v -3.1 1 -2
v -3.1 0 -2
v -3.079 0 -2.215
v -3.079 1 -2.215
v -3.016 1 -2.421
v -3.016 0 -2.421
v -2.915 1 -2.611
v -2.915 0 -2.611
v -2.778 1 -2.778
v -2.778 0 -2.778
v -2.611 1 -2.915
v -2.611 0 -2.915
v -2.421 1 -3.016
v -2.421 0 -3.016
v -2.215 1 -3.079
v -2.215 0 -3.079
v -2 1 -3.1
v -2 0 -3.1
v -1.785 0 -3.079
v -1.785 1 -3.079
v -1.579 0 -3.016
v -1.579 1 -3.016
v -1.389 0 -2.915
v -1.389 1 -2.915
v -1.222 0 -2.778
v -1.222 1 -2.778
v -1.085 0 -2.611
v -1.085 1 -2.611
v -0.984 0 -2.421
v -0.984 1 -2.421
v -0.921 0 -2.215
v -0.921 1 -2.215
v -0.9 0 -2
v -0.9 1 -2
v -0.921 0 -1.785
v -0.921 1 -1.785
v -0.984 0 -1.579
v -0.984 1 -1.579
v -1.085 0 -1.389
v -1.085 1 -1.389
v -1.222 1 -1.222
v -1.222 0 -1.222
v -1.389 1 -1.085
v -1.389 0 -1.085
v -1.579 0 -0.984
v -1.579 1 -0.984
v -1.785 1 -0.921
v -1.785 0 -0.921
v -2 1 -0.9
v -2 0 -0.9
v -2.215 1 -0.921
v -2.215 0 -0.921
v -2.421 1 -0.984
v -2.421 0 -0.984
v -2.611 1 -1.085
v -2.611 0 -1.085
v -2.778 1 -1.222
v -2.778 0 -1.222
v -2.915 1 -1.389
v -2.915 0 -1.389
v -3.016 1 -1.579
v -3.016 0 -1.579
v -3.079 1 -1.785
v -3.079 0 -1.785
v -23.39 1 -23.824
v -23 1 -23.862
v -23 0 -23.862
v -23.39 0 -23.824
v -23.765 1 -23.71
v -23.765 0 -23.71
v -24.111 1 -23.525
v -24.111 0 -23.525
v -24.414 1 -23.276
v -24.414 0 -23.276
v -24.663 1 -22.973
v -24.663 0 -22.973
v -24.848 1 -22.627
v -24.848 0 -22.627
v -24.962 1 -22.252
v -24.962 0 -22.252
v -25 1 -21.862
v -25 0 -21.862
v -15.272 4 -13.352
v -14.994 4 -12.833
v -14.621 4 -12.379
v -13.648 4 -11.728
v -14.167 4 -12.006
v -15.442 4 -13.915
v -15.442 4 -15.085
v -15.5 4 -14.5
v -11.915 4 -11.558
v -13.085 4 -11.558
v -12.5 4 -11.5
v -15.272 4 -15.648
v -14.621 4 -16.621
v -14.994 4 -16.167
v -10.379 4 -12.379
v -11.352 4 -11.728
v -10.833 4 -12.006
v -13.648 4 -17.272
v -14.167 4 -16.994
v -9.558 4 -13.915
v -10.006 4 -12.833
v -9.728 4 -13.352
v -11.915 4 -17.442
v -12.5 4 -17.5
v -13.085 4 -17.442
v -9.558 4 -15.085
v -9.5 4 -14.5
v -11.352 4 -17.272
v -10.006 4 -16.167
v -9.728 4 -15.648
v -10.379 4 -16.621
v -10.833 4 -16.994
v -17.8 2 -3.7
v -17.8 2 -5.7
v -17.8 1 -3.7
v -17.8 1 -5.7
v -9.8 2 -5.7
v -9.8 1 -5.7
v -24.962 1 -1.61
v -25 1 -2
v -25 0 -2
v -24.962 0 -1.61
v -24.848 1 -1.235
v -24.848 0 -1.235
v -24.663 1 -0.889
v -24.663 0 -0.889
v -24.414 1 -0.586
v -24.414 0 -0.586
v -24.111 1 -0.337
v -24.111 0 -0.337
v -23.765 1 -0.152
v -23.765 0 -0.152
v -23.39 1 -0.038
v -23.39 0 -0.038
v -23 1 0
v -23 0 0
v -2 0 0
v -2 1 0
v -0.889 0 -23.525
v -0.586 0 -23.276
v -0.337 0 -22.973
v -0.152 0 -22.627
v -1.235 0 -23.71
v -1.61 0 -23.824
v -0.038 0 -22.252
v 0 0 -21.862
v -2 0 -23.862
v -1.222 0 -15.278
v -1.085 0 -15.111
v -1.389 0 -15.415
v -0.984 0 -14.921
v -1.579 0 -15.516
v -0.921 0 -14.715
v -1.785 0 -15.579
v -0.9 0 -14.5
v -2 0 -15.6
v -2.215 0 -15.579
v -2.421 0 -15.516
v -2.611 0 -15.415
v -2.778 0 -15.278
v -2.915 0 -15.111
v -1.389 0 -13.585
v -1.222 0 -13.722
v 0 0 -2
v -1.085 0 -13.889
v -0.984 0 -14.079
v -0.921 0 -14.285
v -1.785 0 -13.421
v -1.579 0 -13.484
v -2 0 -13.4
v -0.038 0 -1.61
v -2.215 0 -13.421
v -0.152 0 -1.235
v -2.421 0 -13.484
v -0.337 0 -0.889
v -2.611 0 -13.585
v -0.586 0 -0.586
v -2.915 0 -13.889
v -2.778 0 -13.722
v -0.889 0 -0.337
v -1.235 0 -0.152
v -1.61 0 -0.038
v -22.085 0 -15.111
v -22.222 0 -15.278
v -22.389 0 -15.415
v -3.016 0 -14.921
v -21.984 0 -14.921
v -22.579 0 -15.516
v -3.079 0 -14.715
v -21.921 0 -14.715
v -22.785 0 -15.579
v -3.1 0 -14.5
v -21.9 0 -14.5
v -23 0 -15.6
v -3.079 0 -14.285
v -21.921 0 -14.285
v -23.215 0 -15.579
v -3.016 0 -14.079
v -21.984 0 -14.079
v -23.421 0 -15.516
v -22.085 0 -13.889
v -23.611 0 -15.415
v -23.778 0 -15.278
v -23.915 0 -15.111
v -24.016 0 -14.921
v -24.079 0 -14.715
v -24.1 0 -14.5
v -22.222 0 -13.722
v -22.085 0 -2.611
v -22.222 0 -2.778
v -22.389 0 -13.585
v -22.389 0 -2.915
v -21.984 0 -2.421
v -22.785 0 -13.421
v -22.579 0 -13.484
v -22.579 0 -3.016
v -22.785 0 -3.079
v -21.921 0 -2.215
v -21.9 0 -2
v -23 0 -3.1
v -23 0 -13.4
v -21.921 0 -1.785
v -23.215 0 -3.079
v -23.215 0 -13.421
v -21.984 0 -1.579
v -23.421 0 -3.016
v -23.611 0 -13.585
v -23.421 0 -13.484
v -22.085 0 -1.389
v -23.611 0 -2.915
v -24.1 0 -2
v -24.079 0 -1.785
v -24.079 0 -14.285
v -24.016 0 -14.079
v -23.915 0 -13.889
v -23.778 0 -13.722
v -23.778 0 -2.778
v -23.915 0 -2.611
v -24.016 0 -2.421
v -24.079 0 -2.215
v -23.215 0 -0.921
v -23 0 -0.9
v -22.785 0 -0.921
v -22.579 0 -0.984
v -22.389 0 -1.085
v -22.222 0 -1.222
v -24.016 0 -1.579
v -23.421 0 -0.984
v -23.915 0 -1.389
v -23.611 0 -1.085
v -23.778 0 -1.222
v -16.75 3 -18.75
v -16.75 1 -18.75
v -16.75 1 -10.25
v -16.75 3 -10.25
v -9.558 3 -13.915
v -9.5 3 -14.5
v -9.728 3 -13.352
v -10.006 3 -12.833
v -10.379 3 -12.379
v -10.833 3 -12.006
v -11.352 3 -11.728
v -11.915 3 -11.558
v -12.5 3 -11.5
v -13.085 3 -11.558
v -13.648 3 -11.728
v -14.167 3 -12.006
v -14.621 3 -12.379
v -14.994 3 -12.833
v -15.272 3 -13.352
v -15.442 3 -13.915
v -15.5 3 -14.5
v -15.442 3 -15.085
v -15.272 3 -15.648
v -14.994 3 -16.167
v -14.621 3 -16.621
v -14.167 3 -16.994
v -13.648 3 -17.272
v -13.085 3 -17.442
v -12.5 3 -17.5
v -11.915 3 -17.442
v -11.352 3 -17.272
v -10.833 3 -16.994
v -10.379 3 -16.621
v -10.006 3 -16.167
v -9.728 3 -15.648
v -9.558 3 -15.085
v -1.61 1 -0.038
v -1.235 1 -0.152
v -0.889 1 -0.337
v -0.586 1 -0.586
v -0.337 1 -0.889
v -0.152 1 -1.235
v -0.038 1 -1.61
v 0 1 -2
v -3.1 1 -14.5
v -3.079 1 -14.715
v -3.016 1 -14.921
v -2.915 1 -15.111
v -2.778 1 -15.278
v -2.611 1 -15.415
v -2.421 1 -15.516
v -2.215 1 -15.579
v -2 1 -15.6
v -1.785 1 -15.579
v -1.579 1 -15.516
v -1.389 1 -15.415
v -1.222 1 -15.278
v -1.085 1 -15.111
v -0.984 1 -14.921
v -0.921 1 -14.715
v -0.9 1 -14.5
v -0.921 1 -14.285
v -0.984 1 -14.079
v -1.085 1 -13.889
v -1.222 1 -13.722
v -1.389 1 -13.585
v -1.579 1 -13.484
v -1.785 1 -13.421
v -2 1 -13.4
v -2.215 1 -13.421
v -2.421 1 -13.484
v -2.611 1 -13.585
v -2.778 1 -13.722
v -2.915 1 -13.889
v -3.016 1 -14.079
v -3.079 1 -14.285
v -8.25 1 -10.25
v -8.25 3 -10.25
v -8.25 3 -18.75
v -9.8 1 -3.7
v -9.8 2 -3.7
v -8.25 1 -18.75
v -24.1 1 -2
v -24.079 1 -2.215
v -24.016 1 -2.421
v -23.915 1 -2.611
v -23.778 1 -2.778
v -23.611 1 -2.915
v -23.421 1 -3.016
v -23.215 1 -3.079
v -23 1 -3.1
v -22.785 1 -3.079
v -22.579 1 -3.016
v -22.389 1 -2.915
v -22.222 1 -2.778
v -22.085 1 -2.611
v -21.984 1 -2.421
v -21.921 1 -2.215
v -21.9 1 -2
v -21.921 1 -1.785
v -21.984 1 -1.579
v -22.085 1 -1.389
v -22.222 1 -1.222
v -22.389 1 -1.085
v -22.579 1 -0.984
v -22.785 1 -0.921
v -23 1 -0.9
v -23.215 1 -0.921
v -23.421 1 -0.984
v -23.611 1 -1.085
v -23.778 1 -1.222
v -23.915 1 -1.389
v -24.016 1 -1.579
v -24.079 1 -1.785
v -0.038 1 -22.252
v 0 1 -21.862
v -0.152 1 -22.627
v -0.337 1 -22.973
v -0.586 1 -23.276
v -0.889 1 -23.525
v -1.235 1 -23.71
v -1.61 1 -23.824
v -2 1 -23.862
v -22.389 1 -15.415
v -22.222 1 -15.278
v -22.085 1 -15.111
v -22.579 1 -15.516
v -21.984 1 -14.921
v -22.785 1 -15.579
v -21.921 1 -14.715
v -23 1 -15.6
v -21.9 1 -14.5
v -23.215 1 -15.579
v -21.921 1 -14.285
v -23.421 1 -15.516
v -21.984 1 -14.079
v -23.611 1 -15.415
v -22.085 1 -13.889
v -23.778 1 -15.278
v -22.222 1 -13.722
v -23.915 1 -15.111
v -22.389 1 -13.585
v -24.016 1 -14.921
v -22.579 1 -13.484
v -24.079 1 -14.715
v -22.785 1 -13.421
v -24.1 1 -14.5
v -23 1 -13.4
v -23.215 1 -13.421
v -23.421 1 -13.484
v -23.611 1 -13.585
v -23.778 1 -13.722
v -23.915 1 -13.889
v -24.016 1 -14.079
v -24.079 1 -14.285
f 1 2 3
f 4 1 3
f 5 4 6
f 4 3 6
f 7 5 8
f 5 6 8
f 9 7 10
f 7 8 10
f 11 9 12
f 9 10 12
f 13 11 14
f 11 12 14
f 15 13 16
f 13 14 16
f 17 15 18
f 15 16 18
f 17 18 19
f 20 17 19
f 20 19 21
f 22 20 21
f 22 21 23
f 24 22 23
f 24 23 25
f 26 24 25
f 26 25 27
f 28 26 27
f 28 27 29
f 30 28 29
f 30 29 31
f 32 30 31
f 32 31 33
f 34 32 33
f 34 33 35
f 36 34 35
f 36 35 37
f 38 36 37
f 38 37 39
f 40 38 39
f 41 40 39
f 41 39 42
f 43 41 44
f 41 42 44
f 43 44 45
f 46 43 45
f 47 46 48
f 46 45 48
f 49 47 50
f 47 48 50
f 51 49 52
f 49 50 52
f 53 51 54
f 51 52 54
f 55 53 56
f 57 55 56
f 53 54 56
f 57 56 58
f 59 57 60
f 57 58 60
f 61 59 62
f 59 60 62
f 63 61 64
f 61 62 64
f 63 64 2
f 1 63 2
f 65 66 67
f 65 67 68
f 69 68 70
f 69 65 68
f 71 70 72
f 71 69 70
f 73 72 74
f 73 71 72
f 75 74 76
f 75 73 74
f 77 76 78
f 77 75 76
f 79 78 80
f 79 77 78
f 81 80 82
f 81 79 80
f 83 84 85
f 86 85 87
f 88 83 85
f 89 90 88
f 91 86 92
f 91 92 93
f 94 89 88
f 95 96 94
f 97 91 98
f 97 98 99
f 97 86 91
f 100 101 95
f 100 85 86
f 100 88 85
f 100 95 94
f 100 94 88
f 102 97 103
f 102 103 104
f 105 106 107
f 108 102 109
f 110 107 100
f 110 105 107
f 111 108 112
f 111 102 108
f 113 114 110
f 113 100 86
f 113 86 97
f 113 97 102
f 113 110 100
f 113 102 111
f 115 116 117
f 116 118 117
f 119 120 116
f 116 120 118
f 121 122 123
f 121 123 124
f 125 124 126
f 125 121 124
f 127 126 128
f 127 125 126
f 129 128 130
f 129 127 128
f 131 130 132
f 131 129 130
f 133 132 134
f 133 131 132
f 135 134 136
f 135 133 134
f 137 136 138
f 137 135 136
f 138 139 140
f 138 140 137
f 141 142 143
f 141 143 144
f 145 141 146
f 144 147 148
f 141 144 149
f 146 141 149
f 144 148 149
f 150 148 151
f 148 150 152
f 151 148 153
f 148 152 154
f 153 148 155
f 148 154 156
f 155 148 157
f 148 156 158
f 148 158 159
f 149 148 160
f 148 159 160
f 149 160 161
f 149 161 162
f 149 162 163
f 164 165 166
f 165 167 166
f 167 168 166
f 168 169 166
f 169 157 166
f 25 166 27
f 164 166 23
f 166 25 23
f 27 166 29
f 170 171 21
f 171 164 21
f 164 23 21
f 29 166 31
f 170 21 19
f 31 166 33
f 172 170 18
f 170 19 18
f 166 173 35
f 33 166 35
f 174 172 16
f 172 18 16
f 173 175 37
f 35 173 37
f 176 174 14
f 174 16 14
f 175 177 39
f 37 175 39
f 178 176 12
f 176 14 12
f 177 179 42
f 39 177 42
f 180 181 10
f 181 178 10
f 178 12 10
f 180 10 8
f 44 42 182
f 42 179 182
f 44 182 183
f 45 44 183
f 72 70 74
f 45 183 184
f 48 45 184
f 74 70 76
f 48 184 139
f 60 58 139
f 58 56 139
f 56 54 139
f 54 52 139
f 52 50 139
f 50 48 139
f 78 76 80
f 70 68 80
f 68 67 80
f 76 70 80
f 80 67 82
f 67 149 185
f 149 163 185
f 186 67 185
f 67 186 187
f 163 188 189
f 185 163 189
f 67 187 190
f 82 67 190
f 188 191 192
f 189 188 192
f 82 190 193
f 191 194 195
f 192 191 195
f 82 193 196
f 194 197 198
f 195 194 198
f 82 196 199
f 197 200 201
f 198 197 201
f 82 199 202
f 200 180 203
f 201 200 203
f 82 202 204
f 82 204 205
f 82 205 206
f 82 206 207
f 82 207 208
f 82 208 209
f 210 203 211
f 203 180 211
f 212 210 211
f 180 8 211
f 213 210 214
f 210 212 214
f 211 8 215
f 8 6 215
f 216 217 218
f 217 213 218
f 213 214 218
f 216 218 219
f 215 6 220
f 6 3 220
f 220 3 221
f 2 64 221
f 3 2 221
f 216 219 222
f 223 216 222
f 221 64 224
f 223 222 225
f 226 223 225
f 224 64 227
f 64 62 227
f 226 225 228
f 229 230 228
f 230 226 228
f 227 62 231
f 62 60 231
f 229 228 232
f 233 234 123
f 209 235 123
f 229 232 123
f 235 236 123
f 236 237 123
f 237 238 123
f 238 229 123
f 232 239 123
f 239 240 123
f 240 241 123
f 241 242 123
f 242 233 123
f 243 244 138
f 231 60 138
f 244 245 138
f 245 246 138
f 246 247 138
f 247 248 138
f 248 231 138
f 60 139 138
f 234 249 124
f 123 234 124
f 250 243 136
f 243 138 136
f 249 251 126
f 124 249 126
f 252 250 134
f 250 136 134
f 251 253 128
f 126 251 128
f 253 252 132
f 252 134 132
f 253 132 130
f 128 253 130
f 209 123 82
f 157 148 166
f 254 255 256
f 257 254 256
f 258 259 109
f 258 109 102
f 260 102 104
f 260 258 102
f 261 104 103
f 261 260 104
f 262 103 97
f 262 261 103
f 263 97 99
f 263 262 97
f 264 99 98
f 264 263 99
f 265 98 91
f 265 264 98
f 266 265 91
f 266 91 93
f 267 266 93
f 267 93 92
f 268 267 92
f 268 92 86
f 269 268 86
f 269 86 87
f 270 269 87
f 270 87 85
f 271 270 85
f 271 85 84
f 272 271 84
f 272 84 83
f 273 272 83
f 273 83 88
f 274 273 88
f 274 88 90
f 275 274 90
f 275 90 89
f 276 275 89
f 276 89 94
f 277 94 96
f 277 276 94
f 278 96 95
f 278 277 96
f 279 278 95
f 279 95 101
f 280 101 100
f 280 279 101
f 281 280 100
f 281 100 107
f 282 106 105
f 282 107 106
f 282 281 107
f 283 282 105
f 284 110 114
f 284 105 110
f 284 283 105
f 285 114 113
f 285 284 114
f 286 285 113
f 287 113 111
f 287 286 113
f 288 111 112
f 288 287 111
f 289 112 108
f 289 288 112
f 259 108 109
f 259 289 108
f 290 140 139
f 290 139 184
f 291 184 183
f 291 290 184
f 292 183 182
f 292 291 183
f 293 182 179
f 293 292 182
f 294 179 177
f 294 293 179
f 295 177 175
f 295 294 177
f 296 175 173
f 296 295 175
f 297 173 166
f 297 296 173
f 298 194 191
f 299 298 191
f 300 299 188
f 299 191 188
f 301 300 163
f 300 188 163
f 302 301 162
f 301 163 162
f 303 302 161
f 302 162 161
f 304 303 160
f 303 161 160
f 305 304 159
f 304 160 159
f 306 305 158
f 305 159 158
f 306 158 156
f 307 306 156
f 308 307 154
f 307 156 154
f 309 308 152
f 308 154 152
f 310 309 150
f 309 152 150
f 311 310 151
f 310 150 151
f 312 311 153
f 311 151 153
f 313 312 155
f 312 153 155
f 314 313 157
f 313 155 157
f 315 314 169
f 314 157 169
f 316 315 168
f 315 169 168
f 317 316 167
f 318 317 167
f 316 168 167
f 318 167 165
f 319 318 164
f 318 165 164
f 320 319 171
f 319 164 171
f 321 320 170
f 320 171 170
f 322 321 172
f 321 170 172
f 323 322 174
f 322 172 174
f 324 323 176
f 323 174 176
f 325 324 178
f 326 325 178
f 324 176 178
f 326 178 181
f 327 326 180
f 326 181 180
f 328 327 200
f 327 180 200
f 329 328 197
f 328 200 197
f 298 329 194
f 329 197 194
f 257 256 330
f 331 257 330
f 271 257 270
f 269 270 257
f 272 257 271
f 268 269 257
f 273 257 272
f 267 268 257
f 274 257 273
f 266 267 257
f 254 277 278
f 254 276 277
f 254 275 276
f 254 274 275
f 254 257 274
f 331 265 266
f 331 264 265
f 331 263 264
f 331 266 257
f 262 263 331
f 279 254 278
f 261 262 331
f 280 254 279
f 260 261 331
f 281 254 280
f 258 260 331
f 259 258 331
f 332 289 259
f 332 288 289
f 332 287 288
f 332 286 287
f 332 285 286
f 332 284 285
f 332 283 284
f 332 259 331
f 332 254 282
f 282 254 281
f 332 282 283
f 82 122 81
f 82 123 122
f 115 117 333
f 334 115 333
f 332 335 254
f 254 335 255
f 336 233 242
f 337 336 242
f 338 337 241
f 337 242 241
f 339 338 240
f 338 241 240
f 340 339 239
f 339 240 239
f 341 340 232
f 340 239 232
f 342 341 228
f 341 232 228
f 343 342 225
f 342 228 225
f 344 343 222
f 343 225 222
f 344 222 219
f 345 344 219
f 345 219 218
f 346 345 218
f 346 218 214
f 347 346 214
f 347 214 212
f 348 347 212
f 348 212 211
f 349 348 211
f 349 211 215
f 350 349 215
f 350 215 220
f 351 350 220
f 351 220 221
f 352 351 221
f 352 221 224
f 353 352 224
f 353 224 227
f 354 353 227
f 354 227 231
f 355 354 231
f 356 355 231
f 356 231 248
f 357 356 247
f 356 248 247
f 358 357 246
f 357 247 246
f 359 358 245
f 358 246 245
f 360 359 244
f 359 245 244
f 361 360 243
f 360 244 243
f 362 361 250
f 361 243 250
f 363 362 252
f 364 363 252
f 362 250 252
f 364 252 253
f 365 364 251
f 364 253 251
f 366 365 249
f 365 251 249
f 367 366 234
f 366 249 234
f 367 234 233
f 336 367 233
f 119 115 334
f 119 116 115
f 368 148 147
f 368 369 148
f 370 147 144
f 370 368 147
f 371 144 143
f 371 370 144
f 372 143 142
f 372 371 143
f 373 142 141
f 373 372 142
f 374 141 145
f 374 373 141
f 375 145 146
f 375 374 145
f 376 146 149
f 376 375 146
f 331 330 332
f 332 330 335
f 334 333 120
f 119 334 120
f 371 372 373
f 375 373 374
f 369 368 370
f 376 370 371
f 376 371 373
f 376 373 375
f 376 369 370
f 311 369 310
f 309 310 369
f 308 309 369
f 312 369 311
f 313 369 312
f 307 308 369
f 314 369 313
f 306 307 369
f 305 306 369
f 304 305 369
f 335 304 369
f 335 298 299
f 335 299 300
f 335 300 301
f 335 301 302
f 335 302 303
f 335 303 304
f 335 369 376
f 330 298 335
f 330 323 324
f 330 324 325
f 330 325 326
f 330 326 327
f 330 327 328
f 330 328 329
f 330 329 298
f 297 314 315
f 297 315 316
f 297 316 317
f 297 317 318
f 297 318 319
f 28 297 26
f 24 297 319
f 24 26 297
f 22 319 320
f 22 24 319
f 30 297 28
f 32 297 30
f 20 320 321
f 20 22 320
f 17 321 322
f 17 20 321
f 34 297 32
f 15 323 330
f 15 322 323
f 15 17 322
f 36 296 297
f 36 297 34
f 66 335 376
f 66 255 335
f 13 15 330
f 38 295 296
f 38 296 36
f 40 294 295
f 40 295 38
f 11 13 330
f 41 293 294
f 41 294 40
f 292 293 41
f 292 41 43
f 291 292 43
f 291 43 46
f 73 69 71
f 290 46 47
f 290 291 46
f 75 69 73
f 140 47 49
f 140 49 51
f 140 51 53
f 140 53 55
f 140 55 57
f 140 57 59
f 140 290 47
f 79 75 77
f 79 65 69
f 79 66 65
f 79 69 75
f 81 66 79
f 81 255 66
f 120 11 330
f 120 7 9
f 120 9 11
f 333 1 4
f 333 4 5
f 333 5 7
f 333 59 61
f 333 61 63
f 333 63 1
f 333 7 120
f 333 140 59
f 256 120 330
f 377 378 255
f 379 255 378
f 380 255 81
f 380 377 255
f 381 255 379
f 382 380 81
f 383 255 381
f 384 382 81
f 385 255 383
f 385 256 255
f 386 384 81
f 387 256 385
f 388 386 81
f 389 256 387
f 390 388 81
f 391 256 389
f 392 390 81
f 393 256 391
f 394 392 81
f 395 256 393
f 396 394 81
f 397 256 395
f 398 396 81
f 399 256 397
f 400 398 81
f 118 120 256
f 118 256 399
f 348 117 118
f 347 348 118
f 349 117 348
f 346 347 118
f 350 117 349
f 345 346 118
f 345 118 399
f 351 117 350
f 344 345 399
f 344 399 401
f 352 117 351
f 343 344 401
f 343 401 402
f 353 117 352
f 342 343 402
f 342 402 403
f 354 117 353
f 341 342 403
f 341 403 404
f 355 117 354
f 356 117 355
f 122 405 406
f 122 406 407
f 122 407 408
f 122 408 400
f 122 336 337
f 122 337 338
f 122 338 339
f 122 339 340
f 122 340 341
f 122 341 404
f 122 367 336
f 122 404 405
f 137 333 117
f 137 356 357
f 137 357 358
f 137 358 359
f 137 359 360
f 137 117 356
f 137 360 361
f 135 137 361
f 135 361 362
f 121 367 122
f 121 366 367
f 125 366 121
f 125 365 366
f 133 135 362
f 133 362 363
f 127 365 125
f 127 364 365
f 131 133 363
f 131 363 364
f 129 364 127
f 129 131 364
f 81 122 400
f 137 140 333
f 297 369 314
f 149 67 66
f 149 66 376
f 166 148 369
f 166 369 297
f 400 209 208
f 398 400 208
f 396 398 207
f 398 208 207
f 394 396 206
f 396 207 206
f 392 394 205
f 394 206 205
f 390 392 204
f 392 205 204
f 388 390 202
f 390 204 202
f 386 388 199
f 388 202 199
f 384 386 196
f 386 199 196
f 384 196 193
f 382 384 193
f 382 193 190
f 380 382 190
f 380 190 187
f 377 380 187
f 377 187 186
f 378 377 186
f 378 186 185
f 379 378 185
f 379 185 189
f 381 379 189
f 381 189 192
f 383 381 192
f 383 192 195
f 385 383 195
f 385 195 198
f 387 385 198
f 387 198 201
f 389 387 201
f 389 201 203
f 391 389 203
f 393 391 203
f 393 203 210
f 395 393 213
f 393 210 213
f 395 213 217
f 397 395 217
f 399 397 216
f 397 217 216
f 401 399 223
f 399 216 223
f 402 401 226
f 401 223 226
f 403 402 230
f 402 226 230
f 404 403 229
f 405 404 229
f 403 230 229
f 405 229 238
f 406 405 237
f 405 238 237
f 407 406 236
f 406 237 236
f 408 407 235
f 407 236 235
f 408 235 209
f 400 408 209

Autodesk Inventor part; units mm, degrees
ref_plane "YZ Plane" through (0, 0, 0) normal (1, 0, 0) x (0, 1, 0)
ref_plane "XZ Plane" through (0, 0, 0) normal (0, 1, 0) x (-1, 0, 0)
ref_plane "XY Plane" through (0, 0, 0) normal (0, 0, 1) x (1, 0, 0)
sketch "Sketch1" plane through (0, 0, 0) normal (0, 1, 0) x (-1, 0, 0)
  line L0 (0, 0) -> (25, 0)
  line L1 (25, 0) -> (25, -23.862)
  line L2 (25, -23.862) -> (0, -23.862)
  line L3 (0, -23.862) -> (0, 0)
  line L4 (0, 0) -> (0, -2)
  line L5 (0, -2) -> (2, -2)
  line L6 (25, 0) -> (25, -2)
  line L7 (25, -2) -> (23, -2)
  circle A0 centre (2, -2) radius 1.1
  circle A1 centre (23, -2) radius 1.1
  line L8 (0, -2) -> (0, -14.5)
  line L9 (0, -14.5) -> (2, -14.5)
  line L10 (23, -2) -> (23, -14.5)
  circle A2 centre (23, -14.5) radius 1.1
  circle A3 centre (2, -14.5) radius 1.1
  dimension "d0" = 25
  dimension "d1" = 23.862
  dimension "d2" = 2
  dimension "d3" = 2
  dimension "d4" = 2
  dimension "d5" = 2
  dimension "d6" = 2.2
  dimension "d7" = 2.2
  dimension "d8" = 12.5
  dimension "d9" = 2
  dimension "d10" = 12.5
  dimension "d11" = 2.2
  dimension "d12" = 2.2
extrude "Extrusion1" add sketch "Sketch1" along normal blind 1
fillet "Fillet1" radius 2 4 edges at (0, 0.5, 0) (0, 0.5, -23.862) (-25, 0.5, -23.862) (-25, 0.5, 0)
sketch "Sketch2" plane through (0, 1, 0) normal (0, 1, 0) x (1, 0, 0)
  arc A0 (-25, 2) -> (-23, 0) centre (-23, 2) ccw projected
  line L0 (-23, 0) -> (-2, 0) projected
  arc A1 (-2, 0) -> (0, 2) centre (-2, 2) ccw projected
  line L1 (0, 2) -> (0, 21.862) projected
  arc A2 (0, 21.862) -> (-2, 23.862) centre (-2, 21.862) ccw projected
  line L2 (-2, 23.862) -> (-23, 23.862) projected
  arc A3 (-23, 23.862) -> (-25, 21.862) centre (-23, 21.862) ccw projected
  line L3 (-25, 21.862) -> (-25, 2) projected
  circle A4 centre (-23, 14.5) radius 1.1 projected
  circle A5 centre (-23, 2) radius 1.1 projected
  circle A6 centre (-2, 14.5) radius 1.1 projected
  circle A7 centre (-2, 2) radius 1.1 projected
  circle A8 centre (-23, 14.5) radius 1.1 projected
  circle A9 centre (-2, 14.5) radius 1.1 projected
  line L4 (-23, 14.5) -> (-2, 14.5)
  line L5 (-12.5, 14.5) -> (-16.75, 14.5)
  line L6 (-16.75, 14.5) -> (-16.75, 10.25)
  line L7 (-16.75, 10.25) -> (-8.25, 10.25)
  line L8 (-8.25, 10.25) -> (-8.25, 18.75)
  line L9 (-8.25, 18.75) -> (-16.75, 18.75)
  line L10 (-16.75, 18.75) -> (-16.75, 10.25)
  point P0 (0, 0)
  dimension "d16" = 4.25
  dimension "d17" = 4.25
  dimension "d18" = 8.5
  dimension "d19" = 8.5
extrude "Extrusion2" add sketch "Sketch2" along normal blind 2 contours L10 L9 L8 L4 | L4 L8 L7 L6
sketch "Sketch3" plane through (0, 3, 0) normal (0, 1, 0) x (1, 0, 0)
  line L0 (-16.75, 18.75) -> (-16.75, 10.25) projected
  line L1 (-16.75, 10.25) -> (-8.25, 10.25) projected
  line L2 (-8.25, 10.25) -> (-8.25, 18.75) projected
  line L3 (-8.25, 18.75) -> (-16.75, 18.75) projected
  circle A0 centre (-12.5, 14.5) radius 3
  point P0 (0, 0)
  dimension "d22" = 6
extrude "Extrusion3" add sketch "Sketch3" along normal blind 1 contours A0
sketch "Sketch4" plane through (0, 1, 0) normal (0, 1, 0) x (1, 0, 0)
  line L0 (-16.75, 18.75) -> (-8.25, 18.75) projected
  line L1 (-8.25, 18.75) -> (-8.25, 10.25) projected
  line L2 (-8.25, 10.25) -> (-16.75, 10.25) projected
  line L3 (-16.75, 10.25) -> (-16.75, 18.75) projected
  arc A0 (-25, 2) -> (-23, 0) centre (-23, 2) ccw projected
  line L4 (-23, 0) -> (-2, 0) projected
  arc A1 (-2, 0) -> (0, 2) centre (-2, 2) ccw projected
  line L5 (0, 2) -> (0, 21.862) projected
  arc A2 (0, 21.862) -> (-2, 23.862) centre (-2, 21.862) ccw projected
  line L6 (-2, 23.862) -> (-23, 23.862) projected
  arc A3 (-23, 23.862) -> (-25, 21.862) centre (-23, 21.862) ccw projected
  line L7 (-25, 21.862) -> (-25, 2) projected
  circle A4 centre (-23, 14.5) radius 1.1 projected
  circle A5 centre (-23, 2) radius 1.1 projected
  circle A6 centre (-2, 14.5) radius 1.1 projected
  circle A7 centre (-2, 2) radius 1.1 projected
  line L8 (0, 0) -> (-13.8, 0)
  line L9 (-23, 0) -> (-2, 0) projected
  line L10 (-13.8, 0) -> (-13.8, 4.7)
  line L11 (-13.8, 4.7) -> (-9.8, 4.7)
  line L12 (-9.8, 4.7) -> (-9.8, 5.7)
  line L13 (-9.8, 5.7) -> (-17.8, 5.7)
  line L14 (-17.8, 5.7) -> (-17.8, 3.7)
  line L15 (-17.8, 3.7) -> (-9.8, 3.7)
  line L16 (-9.8, 3.7) -> (-9.8, 5.7)
  dimension "d25" = 13.8
  dimension "d26" = 4.7
  dimension "d27" = 4
  dimension "d28" = 1
  dimension "d29" = 8
  dimension "d30" = 2
extrude "Extrusion4" add sketch "Sketch4" along normal blind 1 contours L15 L14 L13 L12 L11 L10 | L10 L11 L16 L15
properties part number "rpiCam"
